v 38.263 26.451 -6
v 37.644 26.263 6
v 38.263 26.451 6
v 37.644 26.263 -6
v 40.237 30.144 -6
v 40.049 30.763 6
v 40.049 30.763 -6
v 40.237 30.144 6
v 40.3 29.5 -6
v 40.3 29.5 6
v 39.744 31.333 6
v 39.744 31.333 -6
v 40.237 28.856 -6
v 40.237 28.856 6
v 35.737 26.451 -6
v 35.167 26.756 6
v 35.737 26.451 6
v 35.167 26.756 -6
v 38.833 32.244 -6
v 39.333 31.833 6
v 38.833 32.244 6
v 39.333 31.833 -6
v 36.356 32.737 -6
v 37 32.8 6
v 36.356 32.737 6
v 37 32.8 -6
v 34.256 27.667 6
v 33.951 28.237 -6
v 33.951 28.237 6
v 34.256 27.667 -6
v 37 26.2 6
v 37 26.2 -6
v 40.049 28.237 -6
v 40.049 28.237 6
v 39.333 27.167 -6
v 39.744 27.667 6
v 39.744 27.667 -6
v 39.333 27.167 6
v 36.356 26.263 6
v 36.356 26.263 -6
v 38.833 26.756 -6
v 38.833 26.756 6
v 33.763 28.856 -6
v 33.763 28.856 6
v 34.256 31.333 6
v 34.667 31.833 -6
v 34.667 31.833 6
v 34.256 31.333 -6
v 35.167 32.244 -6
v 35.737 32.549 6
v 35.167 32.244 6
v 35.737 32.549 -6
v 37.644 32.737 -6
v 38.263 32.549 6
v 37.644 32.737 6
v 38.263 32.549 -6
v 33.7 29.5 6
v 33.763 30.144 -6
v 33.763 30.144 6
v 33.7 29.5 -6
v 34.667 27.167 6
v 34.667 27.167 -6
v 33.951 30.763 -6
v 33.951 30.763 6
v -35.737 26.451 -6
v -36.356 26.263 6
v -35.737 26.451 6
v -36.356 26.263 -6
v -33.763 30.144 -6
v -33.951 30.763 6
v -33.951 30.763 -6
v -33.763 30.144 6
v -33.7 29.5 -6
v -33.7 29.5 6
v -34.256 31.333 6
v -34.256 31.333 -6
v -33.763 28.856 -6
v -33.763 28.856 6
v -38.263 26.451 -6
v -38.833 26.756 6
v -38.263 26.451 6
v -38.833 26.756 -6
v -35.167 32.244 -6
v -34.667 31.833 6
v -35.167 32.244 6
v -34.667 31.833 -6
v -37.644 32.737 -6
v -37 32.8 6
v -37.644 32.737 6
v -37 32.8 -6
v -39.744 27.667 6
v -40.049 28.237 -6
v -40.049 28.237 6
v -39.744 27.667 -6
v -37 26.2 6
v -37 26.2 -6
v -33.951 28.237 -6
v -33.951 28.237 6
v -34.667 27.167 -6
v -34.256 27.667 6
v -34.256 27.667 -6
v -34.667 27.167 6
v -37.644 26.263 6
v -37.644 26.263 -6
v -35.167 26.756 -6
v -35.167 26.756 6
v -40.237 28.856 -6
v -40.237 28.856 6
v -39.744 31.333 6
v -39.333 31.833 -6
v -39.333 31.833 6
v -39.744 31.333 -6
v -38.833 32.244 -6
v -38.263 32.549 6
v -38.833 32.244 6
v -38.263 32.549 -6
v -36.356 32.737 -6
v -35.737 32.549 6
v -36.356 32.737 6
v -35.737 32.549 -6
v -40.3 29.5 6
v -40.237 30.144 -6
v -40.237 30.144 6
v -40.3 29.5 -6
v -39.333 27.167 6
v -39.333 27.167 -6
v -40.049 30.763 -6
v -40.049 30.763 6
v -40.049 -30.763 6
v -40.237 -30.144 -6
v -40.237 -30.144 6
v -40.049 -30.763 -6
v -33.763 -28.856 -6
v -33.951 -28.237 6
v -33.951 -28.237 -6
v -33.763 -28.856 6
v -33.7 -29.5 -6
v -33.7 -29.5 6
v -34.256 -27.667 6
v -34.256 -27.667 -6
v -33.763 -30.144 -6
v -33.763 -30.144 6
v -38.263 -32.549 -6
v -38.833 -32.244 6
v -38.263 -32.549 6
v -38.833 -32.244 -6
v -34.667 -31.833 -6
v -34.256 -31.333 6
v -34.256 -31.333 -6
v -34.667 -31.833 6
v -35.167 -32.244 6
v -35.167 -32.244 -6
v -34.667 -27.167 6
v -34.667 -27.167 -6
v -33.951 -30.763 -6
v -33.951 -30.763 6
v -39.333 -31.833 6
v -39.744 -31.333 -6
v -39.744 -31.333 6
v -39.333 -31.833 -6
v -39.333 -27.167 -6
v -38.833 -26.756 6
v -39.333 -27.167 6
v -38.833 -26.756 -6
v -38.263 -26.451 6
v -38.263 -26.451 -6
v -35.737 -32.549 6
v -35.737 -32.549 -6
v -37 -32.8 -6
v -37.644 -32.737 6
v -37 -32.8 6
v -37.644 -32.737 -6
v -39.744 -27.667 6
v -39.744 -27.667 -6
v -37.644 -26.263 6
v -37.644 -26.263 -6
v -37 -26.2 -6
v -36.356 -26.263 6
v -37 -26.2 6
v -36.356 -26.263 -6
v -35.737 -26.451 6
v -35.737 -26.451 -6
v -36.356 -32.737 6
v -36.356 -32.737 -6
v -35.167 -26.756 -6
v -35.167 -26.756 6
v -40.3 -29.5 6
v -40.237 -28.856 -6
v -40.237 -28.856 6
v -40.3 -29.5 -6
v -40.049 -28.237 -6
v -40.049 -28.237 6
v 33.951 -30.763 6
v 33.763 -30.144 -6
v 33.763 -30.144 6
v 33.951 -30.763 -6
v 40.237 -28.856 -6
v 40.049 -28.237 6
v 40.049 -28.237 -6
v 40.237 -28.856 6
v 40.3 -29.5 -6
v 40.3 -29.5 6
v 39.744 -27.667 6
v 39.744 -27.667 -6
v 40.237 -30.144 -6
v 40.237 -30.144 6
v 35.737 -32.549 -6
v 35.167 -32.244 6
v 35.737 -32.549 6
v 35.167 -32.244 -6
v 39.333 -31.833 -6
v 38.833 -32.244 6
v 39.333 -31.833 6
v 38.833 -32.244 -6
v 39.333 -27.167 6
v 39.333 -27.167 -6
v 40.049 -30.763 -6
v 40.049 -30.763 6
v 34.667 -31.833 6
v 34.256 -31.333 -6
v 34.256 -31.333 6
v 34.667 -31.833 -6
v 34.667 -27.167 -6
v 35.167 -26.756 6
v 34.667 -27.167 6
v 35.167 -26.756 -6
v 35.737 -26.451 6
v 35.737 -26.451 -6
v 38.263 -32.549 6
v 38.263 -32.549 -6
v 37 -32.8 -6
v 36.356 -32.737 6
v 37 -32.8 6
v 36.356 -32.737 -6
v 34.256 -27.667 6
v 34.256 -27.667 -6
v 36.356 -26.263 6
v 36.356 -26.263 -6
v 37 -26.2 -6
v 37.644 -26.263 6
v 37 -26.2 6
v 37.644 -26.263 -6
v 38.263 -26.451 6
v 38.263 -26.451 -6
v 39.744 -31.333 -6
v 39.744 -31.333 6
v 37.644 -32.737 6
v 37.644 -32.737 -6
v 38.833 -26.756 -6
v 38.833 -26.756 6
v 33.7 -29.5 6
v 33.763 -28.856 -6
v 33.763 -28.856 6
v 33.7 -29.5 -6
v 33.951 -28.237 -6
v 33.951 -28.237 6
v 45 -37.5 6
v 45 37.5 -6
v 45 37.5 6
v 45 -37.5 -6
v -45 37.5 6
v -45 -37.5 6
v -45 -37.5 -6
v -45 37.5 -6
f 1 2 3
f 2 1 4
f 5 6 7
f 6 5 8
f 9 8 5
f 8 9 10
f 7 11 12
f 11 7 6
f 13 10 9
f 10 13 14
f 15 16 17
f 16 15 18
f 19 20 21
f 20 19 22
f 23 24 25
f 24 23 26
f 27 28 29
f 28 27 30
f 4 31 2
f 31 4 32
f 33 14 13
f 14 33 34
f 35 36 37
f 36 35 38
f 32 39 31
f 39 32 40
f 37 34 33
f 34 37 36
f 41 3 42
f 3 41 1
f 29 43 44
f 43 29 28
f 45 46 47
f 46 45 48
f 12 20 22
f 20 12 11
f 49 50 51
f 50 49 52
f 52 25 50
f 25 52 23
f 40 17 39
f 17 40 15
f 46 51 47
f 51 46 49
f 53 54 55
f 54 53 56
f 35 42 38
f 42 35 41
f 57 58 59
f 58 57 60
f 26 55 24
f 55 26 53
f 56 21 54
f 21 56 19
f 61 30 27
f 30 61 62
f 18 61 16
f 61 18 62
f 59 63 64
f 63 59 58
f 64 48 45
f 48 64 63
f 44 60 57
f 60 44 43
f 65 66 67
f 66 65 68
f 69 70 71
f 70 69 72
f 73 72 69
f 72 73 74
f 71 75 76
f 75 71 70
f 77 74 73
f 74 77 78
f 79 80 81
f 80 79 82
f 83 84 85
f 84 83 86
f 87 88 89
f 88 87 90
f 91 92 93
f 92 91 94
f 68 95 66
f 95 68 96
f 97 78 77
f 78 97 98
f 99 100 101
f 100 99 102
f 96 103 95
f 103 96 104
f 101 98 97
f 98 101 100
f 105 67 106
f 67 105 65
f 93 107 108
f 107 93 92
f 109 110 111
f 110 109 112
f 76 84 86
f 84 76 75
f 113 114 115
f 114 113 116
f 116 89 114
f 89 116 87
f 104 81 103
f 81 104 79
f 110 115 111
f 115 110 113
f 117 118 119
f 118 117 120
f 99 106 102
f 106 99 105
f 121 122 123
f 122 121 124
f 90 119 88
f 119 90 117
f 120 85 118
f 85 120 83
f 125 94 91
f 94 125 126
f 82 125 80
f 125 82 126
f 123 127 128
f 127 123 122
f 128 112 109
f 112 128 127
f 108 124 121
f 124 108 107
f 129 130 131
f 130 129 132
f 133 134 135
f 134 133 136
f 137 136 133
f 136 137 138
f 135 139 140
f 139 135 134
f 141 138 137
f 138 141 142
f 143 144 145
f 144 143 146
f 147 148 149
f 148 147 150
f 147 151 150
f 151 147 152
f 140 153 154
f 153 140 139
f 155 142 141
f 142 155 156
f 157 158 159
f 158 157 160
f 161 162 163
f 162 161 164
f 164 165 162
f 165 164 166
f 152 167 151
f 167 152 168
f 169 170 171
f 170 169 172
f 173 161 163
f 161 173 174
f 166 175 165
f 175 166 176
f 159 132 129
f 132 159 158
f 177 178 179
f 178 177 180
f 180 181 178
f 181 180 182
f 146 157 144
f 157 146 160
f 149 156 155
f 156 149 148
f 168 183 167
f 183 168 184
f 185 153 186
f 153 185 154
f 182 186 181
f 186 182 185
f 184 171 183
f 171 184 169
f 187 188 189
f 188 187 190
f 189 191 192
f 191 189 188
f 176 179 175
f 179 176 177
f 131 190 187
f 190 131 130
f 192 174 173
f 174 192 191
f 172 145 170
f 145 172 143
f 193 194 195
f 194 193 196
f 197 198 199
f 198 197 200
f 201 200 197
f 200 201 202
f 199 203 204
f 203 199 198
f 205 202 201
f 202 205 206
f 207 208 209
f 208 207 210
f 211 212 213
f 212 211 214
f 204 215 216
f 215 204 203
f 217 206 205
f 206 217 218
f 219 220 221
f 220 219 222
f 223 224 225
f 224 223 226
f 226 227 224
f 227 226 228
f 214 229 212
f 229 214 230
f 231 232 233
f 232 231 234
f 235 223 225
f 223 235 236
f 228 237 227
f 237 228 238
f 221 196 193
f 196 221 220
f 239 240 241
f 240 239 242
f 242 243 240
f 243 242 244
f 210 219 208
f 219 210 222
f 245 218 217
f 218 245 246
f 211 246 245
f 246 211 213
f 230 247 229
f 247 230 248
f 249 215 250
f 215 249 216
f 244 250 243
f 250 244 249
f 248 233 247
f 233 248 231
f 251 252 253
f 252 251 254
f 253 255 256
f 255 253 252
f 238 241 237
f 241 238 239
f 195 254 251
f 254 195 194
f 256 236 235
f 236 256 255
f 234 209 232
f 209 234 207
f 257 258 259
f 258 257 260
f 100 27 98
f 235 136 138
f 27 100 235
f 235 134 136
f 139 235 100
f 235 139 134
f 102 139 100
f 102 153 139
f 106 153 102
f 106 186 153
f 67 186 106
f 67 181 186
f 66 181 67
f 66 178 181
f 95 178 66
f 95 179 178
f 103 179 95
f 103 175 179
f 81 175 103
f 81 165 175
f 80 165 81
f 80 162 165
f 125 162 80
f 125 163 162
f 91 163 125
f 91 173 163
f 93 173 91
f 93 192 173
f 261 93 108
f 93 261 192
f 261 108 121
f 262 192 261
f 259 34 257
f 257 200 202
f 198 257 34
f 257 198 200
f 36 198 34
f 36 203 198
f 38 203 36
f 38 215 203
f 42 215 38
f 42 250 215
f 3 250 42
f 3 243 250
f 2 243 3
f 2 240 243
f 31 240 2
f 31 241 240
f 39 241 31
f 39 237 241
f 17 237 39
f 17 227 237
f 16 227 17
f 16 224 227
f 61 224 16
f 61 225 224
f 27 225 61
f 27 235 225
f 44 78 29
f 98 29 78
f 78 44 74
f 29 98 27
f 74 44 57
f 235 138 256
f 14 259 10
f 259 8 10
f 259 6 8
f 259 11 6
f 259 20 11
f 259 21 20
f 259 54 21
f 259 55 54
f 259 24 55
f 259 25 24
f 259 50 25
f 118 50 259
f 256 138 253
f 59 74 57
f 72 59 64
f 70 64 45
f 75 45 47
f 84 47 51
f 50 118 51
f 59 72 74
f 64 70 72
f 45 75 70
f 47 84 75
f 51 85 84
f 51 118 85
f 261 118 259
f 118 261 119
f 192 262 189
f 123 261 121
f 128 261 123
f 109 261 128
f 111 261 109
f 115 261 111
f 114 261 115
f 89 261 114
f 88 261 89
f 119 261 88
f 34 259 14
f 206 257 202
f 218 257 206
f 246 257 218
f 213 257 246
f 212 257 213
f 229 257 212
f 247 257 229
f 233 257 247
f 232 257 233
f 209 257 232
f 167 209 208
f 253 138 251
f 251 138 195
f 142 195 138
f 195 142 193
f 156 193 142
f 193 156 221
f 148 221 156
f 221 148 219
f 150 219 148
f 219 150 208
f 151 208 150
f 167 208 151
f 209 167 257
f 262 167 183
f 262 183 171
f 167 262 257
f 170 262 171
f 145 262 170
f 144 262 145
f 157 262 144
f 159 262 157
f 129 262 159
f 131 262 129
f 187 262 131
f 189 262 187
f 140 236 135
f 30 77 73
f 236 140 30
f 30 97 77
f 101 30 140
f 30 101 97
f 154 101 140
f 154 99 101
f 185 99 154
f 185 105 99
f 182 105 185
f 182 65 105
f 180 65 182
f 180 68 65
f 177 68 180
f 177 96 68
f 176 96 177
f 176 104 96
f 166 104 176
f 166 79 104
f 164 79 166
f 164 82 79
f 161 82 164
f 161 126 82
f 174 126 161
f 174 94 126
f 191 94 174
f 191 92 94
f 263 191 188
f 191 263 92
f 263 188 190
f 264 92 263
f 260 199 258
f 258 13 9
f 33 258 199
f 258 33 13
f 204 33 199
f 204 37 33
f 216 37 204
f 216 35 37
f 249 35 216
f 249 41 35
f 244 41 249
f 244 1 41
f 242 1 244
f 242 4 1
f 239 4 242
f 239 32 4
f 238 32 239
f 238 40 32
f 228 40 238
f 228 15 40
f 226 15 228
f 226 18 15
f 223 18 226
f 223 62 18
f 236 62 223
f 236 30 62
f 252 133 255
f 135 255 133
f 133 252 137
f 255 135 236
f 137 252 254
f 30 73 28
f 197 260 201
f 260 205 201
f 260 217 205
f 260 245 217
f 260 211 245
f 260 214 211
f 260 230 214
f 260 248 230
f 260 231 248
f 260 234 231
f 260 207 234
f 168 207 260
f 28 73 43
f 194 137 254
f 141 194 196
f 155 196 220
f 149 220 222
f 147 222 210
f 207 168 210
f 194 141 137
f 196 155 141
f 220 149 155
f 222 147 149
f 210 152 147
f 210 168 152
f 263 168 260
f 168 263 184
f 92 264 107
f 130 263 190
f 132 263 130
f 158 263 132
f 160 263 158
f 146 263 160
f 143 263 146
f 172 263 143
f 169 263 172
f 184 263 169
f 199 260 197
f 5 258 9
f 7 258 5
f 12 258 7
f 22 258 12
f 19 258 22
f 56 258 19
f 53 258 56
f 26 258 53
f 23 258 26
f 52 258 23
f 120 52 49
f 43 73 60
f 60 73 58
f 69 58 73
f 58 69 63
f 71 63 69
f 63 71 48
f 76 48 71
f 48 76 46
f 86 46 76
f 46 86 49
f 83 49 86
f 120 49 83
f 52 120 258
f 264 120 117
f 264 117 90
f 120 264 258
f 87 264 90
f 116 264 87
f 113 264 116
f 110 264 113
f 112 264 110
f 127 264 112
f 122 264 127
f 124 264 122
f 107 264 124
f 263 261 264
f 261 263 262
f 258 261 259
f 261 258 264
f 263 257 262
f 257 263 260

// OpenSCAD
$fn = 32;

// ----------------------------------------------------------------------
// Corner plate 90 x 75 x 12
// 4 holes, centres taken from the edge offset
// ----------------------------------------------------------------------

// --- parameters (mm) ---
plate = [90, 75, 12];  // overall size (x, y, z)
holes = 4;             // number of holes the drawing asks for
hole_d = 6.6;          // hole diameter
edge = 8;              // hole centre offset from the plate edge

// --- derived feature positions (mm) ---
corner_x = plate[0] / 2 - edge;  // = 37   corner hole X
corner_y = plate[1] / 2 - edge;  // = 29.5   corner hole Y
feature_centers = [
  [corner_x, corner_y],
  [-corner_x, corner_y],
  [-corner_x, -corner_y],
  [corner_x, -corner_y]
];   // hole centres the loop below drills

// plate outline, every hole drilled through with the same cutters
difference() {
  cube(plate, center = true);
  for (centre = feature_centers)
    translate([centre[0], centre[1], 0])
      cylinder(d = hole_d, h = plate[2] + 2, center = true);
}
